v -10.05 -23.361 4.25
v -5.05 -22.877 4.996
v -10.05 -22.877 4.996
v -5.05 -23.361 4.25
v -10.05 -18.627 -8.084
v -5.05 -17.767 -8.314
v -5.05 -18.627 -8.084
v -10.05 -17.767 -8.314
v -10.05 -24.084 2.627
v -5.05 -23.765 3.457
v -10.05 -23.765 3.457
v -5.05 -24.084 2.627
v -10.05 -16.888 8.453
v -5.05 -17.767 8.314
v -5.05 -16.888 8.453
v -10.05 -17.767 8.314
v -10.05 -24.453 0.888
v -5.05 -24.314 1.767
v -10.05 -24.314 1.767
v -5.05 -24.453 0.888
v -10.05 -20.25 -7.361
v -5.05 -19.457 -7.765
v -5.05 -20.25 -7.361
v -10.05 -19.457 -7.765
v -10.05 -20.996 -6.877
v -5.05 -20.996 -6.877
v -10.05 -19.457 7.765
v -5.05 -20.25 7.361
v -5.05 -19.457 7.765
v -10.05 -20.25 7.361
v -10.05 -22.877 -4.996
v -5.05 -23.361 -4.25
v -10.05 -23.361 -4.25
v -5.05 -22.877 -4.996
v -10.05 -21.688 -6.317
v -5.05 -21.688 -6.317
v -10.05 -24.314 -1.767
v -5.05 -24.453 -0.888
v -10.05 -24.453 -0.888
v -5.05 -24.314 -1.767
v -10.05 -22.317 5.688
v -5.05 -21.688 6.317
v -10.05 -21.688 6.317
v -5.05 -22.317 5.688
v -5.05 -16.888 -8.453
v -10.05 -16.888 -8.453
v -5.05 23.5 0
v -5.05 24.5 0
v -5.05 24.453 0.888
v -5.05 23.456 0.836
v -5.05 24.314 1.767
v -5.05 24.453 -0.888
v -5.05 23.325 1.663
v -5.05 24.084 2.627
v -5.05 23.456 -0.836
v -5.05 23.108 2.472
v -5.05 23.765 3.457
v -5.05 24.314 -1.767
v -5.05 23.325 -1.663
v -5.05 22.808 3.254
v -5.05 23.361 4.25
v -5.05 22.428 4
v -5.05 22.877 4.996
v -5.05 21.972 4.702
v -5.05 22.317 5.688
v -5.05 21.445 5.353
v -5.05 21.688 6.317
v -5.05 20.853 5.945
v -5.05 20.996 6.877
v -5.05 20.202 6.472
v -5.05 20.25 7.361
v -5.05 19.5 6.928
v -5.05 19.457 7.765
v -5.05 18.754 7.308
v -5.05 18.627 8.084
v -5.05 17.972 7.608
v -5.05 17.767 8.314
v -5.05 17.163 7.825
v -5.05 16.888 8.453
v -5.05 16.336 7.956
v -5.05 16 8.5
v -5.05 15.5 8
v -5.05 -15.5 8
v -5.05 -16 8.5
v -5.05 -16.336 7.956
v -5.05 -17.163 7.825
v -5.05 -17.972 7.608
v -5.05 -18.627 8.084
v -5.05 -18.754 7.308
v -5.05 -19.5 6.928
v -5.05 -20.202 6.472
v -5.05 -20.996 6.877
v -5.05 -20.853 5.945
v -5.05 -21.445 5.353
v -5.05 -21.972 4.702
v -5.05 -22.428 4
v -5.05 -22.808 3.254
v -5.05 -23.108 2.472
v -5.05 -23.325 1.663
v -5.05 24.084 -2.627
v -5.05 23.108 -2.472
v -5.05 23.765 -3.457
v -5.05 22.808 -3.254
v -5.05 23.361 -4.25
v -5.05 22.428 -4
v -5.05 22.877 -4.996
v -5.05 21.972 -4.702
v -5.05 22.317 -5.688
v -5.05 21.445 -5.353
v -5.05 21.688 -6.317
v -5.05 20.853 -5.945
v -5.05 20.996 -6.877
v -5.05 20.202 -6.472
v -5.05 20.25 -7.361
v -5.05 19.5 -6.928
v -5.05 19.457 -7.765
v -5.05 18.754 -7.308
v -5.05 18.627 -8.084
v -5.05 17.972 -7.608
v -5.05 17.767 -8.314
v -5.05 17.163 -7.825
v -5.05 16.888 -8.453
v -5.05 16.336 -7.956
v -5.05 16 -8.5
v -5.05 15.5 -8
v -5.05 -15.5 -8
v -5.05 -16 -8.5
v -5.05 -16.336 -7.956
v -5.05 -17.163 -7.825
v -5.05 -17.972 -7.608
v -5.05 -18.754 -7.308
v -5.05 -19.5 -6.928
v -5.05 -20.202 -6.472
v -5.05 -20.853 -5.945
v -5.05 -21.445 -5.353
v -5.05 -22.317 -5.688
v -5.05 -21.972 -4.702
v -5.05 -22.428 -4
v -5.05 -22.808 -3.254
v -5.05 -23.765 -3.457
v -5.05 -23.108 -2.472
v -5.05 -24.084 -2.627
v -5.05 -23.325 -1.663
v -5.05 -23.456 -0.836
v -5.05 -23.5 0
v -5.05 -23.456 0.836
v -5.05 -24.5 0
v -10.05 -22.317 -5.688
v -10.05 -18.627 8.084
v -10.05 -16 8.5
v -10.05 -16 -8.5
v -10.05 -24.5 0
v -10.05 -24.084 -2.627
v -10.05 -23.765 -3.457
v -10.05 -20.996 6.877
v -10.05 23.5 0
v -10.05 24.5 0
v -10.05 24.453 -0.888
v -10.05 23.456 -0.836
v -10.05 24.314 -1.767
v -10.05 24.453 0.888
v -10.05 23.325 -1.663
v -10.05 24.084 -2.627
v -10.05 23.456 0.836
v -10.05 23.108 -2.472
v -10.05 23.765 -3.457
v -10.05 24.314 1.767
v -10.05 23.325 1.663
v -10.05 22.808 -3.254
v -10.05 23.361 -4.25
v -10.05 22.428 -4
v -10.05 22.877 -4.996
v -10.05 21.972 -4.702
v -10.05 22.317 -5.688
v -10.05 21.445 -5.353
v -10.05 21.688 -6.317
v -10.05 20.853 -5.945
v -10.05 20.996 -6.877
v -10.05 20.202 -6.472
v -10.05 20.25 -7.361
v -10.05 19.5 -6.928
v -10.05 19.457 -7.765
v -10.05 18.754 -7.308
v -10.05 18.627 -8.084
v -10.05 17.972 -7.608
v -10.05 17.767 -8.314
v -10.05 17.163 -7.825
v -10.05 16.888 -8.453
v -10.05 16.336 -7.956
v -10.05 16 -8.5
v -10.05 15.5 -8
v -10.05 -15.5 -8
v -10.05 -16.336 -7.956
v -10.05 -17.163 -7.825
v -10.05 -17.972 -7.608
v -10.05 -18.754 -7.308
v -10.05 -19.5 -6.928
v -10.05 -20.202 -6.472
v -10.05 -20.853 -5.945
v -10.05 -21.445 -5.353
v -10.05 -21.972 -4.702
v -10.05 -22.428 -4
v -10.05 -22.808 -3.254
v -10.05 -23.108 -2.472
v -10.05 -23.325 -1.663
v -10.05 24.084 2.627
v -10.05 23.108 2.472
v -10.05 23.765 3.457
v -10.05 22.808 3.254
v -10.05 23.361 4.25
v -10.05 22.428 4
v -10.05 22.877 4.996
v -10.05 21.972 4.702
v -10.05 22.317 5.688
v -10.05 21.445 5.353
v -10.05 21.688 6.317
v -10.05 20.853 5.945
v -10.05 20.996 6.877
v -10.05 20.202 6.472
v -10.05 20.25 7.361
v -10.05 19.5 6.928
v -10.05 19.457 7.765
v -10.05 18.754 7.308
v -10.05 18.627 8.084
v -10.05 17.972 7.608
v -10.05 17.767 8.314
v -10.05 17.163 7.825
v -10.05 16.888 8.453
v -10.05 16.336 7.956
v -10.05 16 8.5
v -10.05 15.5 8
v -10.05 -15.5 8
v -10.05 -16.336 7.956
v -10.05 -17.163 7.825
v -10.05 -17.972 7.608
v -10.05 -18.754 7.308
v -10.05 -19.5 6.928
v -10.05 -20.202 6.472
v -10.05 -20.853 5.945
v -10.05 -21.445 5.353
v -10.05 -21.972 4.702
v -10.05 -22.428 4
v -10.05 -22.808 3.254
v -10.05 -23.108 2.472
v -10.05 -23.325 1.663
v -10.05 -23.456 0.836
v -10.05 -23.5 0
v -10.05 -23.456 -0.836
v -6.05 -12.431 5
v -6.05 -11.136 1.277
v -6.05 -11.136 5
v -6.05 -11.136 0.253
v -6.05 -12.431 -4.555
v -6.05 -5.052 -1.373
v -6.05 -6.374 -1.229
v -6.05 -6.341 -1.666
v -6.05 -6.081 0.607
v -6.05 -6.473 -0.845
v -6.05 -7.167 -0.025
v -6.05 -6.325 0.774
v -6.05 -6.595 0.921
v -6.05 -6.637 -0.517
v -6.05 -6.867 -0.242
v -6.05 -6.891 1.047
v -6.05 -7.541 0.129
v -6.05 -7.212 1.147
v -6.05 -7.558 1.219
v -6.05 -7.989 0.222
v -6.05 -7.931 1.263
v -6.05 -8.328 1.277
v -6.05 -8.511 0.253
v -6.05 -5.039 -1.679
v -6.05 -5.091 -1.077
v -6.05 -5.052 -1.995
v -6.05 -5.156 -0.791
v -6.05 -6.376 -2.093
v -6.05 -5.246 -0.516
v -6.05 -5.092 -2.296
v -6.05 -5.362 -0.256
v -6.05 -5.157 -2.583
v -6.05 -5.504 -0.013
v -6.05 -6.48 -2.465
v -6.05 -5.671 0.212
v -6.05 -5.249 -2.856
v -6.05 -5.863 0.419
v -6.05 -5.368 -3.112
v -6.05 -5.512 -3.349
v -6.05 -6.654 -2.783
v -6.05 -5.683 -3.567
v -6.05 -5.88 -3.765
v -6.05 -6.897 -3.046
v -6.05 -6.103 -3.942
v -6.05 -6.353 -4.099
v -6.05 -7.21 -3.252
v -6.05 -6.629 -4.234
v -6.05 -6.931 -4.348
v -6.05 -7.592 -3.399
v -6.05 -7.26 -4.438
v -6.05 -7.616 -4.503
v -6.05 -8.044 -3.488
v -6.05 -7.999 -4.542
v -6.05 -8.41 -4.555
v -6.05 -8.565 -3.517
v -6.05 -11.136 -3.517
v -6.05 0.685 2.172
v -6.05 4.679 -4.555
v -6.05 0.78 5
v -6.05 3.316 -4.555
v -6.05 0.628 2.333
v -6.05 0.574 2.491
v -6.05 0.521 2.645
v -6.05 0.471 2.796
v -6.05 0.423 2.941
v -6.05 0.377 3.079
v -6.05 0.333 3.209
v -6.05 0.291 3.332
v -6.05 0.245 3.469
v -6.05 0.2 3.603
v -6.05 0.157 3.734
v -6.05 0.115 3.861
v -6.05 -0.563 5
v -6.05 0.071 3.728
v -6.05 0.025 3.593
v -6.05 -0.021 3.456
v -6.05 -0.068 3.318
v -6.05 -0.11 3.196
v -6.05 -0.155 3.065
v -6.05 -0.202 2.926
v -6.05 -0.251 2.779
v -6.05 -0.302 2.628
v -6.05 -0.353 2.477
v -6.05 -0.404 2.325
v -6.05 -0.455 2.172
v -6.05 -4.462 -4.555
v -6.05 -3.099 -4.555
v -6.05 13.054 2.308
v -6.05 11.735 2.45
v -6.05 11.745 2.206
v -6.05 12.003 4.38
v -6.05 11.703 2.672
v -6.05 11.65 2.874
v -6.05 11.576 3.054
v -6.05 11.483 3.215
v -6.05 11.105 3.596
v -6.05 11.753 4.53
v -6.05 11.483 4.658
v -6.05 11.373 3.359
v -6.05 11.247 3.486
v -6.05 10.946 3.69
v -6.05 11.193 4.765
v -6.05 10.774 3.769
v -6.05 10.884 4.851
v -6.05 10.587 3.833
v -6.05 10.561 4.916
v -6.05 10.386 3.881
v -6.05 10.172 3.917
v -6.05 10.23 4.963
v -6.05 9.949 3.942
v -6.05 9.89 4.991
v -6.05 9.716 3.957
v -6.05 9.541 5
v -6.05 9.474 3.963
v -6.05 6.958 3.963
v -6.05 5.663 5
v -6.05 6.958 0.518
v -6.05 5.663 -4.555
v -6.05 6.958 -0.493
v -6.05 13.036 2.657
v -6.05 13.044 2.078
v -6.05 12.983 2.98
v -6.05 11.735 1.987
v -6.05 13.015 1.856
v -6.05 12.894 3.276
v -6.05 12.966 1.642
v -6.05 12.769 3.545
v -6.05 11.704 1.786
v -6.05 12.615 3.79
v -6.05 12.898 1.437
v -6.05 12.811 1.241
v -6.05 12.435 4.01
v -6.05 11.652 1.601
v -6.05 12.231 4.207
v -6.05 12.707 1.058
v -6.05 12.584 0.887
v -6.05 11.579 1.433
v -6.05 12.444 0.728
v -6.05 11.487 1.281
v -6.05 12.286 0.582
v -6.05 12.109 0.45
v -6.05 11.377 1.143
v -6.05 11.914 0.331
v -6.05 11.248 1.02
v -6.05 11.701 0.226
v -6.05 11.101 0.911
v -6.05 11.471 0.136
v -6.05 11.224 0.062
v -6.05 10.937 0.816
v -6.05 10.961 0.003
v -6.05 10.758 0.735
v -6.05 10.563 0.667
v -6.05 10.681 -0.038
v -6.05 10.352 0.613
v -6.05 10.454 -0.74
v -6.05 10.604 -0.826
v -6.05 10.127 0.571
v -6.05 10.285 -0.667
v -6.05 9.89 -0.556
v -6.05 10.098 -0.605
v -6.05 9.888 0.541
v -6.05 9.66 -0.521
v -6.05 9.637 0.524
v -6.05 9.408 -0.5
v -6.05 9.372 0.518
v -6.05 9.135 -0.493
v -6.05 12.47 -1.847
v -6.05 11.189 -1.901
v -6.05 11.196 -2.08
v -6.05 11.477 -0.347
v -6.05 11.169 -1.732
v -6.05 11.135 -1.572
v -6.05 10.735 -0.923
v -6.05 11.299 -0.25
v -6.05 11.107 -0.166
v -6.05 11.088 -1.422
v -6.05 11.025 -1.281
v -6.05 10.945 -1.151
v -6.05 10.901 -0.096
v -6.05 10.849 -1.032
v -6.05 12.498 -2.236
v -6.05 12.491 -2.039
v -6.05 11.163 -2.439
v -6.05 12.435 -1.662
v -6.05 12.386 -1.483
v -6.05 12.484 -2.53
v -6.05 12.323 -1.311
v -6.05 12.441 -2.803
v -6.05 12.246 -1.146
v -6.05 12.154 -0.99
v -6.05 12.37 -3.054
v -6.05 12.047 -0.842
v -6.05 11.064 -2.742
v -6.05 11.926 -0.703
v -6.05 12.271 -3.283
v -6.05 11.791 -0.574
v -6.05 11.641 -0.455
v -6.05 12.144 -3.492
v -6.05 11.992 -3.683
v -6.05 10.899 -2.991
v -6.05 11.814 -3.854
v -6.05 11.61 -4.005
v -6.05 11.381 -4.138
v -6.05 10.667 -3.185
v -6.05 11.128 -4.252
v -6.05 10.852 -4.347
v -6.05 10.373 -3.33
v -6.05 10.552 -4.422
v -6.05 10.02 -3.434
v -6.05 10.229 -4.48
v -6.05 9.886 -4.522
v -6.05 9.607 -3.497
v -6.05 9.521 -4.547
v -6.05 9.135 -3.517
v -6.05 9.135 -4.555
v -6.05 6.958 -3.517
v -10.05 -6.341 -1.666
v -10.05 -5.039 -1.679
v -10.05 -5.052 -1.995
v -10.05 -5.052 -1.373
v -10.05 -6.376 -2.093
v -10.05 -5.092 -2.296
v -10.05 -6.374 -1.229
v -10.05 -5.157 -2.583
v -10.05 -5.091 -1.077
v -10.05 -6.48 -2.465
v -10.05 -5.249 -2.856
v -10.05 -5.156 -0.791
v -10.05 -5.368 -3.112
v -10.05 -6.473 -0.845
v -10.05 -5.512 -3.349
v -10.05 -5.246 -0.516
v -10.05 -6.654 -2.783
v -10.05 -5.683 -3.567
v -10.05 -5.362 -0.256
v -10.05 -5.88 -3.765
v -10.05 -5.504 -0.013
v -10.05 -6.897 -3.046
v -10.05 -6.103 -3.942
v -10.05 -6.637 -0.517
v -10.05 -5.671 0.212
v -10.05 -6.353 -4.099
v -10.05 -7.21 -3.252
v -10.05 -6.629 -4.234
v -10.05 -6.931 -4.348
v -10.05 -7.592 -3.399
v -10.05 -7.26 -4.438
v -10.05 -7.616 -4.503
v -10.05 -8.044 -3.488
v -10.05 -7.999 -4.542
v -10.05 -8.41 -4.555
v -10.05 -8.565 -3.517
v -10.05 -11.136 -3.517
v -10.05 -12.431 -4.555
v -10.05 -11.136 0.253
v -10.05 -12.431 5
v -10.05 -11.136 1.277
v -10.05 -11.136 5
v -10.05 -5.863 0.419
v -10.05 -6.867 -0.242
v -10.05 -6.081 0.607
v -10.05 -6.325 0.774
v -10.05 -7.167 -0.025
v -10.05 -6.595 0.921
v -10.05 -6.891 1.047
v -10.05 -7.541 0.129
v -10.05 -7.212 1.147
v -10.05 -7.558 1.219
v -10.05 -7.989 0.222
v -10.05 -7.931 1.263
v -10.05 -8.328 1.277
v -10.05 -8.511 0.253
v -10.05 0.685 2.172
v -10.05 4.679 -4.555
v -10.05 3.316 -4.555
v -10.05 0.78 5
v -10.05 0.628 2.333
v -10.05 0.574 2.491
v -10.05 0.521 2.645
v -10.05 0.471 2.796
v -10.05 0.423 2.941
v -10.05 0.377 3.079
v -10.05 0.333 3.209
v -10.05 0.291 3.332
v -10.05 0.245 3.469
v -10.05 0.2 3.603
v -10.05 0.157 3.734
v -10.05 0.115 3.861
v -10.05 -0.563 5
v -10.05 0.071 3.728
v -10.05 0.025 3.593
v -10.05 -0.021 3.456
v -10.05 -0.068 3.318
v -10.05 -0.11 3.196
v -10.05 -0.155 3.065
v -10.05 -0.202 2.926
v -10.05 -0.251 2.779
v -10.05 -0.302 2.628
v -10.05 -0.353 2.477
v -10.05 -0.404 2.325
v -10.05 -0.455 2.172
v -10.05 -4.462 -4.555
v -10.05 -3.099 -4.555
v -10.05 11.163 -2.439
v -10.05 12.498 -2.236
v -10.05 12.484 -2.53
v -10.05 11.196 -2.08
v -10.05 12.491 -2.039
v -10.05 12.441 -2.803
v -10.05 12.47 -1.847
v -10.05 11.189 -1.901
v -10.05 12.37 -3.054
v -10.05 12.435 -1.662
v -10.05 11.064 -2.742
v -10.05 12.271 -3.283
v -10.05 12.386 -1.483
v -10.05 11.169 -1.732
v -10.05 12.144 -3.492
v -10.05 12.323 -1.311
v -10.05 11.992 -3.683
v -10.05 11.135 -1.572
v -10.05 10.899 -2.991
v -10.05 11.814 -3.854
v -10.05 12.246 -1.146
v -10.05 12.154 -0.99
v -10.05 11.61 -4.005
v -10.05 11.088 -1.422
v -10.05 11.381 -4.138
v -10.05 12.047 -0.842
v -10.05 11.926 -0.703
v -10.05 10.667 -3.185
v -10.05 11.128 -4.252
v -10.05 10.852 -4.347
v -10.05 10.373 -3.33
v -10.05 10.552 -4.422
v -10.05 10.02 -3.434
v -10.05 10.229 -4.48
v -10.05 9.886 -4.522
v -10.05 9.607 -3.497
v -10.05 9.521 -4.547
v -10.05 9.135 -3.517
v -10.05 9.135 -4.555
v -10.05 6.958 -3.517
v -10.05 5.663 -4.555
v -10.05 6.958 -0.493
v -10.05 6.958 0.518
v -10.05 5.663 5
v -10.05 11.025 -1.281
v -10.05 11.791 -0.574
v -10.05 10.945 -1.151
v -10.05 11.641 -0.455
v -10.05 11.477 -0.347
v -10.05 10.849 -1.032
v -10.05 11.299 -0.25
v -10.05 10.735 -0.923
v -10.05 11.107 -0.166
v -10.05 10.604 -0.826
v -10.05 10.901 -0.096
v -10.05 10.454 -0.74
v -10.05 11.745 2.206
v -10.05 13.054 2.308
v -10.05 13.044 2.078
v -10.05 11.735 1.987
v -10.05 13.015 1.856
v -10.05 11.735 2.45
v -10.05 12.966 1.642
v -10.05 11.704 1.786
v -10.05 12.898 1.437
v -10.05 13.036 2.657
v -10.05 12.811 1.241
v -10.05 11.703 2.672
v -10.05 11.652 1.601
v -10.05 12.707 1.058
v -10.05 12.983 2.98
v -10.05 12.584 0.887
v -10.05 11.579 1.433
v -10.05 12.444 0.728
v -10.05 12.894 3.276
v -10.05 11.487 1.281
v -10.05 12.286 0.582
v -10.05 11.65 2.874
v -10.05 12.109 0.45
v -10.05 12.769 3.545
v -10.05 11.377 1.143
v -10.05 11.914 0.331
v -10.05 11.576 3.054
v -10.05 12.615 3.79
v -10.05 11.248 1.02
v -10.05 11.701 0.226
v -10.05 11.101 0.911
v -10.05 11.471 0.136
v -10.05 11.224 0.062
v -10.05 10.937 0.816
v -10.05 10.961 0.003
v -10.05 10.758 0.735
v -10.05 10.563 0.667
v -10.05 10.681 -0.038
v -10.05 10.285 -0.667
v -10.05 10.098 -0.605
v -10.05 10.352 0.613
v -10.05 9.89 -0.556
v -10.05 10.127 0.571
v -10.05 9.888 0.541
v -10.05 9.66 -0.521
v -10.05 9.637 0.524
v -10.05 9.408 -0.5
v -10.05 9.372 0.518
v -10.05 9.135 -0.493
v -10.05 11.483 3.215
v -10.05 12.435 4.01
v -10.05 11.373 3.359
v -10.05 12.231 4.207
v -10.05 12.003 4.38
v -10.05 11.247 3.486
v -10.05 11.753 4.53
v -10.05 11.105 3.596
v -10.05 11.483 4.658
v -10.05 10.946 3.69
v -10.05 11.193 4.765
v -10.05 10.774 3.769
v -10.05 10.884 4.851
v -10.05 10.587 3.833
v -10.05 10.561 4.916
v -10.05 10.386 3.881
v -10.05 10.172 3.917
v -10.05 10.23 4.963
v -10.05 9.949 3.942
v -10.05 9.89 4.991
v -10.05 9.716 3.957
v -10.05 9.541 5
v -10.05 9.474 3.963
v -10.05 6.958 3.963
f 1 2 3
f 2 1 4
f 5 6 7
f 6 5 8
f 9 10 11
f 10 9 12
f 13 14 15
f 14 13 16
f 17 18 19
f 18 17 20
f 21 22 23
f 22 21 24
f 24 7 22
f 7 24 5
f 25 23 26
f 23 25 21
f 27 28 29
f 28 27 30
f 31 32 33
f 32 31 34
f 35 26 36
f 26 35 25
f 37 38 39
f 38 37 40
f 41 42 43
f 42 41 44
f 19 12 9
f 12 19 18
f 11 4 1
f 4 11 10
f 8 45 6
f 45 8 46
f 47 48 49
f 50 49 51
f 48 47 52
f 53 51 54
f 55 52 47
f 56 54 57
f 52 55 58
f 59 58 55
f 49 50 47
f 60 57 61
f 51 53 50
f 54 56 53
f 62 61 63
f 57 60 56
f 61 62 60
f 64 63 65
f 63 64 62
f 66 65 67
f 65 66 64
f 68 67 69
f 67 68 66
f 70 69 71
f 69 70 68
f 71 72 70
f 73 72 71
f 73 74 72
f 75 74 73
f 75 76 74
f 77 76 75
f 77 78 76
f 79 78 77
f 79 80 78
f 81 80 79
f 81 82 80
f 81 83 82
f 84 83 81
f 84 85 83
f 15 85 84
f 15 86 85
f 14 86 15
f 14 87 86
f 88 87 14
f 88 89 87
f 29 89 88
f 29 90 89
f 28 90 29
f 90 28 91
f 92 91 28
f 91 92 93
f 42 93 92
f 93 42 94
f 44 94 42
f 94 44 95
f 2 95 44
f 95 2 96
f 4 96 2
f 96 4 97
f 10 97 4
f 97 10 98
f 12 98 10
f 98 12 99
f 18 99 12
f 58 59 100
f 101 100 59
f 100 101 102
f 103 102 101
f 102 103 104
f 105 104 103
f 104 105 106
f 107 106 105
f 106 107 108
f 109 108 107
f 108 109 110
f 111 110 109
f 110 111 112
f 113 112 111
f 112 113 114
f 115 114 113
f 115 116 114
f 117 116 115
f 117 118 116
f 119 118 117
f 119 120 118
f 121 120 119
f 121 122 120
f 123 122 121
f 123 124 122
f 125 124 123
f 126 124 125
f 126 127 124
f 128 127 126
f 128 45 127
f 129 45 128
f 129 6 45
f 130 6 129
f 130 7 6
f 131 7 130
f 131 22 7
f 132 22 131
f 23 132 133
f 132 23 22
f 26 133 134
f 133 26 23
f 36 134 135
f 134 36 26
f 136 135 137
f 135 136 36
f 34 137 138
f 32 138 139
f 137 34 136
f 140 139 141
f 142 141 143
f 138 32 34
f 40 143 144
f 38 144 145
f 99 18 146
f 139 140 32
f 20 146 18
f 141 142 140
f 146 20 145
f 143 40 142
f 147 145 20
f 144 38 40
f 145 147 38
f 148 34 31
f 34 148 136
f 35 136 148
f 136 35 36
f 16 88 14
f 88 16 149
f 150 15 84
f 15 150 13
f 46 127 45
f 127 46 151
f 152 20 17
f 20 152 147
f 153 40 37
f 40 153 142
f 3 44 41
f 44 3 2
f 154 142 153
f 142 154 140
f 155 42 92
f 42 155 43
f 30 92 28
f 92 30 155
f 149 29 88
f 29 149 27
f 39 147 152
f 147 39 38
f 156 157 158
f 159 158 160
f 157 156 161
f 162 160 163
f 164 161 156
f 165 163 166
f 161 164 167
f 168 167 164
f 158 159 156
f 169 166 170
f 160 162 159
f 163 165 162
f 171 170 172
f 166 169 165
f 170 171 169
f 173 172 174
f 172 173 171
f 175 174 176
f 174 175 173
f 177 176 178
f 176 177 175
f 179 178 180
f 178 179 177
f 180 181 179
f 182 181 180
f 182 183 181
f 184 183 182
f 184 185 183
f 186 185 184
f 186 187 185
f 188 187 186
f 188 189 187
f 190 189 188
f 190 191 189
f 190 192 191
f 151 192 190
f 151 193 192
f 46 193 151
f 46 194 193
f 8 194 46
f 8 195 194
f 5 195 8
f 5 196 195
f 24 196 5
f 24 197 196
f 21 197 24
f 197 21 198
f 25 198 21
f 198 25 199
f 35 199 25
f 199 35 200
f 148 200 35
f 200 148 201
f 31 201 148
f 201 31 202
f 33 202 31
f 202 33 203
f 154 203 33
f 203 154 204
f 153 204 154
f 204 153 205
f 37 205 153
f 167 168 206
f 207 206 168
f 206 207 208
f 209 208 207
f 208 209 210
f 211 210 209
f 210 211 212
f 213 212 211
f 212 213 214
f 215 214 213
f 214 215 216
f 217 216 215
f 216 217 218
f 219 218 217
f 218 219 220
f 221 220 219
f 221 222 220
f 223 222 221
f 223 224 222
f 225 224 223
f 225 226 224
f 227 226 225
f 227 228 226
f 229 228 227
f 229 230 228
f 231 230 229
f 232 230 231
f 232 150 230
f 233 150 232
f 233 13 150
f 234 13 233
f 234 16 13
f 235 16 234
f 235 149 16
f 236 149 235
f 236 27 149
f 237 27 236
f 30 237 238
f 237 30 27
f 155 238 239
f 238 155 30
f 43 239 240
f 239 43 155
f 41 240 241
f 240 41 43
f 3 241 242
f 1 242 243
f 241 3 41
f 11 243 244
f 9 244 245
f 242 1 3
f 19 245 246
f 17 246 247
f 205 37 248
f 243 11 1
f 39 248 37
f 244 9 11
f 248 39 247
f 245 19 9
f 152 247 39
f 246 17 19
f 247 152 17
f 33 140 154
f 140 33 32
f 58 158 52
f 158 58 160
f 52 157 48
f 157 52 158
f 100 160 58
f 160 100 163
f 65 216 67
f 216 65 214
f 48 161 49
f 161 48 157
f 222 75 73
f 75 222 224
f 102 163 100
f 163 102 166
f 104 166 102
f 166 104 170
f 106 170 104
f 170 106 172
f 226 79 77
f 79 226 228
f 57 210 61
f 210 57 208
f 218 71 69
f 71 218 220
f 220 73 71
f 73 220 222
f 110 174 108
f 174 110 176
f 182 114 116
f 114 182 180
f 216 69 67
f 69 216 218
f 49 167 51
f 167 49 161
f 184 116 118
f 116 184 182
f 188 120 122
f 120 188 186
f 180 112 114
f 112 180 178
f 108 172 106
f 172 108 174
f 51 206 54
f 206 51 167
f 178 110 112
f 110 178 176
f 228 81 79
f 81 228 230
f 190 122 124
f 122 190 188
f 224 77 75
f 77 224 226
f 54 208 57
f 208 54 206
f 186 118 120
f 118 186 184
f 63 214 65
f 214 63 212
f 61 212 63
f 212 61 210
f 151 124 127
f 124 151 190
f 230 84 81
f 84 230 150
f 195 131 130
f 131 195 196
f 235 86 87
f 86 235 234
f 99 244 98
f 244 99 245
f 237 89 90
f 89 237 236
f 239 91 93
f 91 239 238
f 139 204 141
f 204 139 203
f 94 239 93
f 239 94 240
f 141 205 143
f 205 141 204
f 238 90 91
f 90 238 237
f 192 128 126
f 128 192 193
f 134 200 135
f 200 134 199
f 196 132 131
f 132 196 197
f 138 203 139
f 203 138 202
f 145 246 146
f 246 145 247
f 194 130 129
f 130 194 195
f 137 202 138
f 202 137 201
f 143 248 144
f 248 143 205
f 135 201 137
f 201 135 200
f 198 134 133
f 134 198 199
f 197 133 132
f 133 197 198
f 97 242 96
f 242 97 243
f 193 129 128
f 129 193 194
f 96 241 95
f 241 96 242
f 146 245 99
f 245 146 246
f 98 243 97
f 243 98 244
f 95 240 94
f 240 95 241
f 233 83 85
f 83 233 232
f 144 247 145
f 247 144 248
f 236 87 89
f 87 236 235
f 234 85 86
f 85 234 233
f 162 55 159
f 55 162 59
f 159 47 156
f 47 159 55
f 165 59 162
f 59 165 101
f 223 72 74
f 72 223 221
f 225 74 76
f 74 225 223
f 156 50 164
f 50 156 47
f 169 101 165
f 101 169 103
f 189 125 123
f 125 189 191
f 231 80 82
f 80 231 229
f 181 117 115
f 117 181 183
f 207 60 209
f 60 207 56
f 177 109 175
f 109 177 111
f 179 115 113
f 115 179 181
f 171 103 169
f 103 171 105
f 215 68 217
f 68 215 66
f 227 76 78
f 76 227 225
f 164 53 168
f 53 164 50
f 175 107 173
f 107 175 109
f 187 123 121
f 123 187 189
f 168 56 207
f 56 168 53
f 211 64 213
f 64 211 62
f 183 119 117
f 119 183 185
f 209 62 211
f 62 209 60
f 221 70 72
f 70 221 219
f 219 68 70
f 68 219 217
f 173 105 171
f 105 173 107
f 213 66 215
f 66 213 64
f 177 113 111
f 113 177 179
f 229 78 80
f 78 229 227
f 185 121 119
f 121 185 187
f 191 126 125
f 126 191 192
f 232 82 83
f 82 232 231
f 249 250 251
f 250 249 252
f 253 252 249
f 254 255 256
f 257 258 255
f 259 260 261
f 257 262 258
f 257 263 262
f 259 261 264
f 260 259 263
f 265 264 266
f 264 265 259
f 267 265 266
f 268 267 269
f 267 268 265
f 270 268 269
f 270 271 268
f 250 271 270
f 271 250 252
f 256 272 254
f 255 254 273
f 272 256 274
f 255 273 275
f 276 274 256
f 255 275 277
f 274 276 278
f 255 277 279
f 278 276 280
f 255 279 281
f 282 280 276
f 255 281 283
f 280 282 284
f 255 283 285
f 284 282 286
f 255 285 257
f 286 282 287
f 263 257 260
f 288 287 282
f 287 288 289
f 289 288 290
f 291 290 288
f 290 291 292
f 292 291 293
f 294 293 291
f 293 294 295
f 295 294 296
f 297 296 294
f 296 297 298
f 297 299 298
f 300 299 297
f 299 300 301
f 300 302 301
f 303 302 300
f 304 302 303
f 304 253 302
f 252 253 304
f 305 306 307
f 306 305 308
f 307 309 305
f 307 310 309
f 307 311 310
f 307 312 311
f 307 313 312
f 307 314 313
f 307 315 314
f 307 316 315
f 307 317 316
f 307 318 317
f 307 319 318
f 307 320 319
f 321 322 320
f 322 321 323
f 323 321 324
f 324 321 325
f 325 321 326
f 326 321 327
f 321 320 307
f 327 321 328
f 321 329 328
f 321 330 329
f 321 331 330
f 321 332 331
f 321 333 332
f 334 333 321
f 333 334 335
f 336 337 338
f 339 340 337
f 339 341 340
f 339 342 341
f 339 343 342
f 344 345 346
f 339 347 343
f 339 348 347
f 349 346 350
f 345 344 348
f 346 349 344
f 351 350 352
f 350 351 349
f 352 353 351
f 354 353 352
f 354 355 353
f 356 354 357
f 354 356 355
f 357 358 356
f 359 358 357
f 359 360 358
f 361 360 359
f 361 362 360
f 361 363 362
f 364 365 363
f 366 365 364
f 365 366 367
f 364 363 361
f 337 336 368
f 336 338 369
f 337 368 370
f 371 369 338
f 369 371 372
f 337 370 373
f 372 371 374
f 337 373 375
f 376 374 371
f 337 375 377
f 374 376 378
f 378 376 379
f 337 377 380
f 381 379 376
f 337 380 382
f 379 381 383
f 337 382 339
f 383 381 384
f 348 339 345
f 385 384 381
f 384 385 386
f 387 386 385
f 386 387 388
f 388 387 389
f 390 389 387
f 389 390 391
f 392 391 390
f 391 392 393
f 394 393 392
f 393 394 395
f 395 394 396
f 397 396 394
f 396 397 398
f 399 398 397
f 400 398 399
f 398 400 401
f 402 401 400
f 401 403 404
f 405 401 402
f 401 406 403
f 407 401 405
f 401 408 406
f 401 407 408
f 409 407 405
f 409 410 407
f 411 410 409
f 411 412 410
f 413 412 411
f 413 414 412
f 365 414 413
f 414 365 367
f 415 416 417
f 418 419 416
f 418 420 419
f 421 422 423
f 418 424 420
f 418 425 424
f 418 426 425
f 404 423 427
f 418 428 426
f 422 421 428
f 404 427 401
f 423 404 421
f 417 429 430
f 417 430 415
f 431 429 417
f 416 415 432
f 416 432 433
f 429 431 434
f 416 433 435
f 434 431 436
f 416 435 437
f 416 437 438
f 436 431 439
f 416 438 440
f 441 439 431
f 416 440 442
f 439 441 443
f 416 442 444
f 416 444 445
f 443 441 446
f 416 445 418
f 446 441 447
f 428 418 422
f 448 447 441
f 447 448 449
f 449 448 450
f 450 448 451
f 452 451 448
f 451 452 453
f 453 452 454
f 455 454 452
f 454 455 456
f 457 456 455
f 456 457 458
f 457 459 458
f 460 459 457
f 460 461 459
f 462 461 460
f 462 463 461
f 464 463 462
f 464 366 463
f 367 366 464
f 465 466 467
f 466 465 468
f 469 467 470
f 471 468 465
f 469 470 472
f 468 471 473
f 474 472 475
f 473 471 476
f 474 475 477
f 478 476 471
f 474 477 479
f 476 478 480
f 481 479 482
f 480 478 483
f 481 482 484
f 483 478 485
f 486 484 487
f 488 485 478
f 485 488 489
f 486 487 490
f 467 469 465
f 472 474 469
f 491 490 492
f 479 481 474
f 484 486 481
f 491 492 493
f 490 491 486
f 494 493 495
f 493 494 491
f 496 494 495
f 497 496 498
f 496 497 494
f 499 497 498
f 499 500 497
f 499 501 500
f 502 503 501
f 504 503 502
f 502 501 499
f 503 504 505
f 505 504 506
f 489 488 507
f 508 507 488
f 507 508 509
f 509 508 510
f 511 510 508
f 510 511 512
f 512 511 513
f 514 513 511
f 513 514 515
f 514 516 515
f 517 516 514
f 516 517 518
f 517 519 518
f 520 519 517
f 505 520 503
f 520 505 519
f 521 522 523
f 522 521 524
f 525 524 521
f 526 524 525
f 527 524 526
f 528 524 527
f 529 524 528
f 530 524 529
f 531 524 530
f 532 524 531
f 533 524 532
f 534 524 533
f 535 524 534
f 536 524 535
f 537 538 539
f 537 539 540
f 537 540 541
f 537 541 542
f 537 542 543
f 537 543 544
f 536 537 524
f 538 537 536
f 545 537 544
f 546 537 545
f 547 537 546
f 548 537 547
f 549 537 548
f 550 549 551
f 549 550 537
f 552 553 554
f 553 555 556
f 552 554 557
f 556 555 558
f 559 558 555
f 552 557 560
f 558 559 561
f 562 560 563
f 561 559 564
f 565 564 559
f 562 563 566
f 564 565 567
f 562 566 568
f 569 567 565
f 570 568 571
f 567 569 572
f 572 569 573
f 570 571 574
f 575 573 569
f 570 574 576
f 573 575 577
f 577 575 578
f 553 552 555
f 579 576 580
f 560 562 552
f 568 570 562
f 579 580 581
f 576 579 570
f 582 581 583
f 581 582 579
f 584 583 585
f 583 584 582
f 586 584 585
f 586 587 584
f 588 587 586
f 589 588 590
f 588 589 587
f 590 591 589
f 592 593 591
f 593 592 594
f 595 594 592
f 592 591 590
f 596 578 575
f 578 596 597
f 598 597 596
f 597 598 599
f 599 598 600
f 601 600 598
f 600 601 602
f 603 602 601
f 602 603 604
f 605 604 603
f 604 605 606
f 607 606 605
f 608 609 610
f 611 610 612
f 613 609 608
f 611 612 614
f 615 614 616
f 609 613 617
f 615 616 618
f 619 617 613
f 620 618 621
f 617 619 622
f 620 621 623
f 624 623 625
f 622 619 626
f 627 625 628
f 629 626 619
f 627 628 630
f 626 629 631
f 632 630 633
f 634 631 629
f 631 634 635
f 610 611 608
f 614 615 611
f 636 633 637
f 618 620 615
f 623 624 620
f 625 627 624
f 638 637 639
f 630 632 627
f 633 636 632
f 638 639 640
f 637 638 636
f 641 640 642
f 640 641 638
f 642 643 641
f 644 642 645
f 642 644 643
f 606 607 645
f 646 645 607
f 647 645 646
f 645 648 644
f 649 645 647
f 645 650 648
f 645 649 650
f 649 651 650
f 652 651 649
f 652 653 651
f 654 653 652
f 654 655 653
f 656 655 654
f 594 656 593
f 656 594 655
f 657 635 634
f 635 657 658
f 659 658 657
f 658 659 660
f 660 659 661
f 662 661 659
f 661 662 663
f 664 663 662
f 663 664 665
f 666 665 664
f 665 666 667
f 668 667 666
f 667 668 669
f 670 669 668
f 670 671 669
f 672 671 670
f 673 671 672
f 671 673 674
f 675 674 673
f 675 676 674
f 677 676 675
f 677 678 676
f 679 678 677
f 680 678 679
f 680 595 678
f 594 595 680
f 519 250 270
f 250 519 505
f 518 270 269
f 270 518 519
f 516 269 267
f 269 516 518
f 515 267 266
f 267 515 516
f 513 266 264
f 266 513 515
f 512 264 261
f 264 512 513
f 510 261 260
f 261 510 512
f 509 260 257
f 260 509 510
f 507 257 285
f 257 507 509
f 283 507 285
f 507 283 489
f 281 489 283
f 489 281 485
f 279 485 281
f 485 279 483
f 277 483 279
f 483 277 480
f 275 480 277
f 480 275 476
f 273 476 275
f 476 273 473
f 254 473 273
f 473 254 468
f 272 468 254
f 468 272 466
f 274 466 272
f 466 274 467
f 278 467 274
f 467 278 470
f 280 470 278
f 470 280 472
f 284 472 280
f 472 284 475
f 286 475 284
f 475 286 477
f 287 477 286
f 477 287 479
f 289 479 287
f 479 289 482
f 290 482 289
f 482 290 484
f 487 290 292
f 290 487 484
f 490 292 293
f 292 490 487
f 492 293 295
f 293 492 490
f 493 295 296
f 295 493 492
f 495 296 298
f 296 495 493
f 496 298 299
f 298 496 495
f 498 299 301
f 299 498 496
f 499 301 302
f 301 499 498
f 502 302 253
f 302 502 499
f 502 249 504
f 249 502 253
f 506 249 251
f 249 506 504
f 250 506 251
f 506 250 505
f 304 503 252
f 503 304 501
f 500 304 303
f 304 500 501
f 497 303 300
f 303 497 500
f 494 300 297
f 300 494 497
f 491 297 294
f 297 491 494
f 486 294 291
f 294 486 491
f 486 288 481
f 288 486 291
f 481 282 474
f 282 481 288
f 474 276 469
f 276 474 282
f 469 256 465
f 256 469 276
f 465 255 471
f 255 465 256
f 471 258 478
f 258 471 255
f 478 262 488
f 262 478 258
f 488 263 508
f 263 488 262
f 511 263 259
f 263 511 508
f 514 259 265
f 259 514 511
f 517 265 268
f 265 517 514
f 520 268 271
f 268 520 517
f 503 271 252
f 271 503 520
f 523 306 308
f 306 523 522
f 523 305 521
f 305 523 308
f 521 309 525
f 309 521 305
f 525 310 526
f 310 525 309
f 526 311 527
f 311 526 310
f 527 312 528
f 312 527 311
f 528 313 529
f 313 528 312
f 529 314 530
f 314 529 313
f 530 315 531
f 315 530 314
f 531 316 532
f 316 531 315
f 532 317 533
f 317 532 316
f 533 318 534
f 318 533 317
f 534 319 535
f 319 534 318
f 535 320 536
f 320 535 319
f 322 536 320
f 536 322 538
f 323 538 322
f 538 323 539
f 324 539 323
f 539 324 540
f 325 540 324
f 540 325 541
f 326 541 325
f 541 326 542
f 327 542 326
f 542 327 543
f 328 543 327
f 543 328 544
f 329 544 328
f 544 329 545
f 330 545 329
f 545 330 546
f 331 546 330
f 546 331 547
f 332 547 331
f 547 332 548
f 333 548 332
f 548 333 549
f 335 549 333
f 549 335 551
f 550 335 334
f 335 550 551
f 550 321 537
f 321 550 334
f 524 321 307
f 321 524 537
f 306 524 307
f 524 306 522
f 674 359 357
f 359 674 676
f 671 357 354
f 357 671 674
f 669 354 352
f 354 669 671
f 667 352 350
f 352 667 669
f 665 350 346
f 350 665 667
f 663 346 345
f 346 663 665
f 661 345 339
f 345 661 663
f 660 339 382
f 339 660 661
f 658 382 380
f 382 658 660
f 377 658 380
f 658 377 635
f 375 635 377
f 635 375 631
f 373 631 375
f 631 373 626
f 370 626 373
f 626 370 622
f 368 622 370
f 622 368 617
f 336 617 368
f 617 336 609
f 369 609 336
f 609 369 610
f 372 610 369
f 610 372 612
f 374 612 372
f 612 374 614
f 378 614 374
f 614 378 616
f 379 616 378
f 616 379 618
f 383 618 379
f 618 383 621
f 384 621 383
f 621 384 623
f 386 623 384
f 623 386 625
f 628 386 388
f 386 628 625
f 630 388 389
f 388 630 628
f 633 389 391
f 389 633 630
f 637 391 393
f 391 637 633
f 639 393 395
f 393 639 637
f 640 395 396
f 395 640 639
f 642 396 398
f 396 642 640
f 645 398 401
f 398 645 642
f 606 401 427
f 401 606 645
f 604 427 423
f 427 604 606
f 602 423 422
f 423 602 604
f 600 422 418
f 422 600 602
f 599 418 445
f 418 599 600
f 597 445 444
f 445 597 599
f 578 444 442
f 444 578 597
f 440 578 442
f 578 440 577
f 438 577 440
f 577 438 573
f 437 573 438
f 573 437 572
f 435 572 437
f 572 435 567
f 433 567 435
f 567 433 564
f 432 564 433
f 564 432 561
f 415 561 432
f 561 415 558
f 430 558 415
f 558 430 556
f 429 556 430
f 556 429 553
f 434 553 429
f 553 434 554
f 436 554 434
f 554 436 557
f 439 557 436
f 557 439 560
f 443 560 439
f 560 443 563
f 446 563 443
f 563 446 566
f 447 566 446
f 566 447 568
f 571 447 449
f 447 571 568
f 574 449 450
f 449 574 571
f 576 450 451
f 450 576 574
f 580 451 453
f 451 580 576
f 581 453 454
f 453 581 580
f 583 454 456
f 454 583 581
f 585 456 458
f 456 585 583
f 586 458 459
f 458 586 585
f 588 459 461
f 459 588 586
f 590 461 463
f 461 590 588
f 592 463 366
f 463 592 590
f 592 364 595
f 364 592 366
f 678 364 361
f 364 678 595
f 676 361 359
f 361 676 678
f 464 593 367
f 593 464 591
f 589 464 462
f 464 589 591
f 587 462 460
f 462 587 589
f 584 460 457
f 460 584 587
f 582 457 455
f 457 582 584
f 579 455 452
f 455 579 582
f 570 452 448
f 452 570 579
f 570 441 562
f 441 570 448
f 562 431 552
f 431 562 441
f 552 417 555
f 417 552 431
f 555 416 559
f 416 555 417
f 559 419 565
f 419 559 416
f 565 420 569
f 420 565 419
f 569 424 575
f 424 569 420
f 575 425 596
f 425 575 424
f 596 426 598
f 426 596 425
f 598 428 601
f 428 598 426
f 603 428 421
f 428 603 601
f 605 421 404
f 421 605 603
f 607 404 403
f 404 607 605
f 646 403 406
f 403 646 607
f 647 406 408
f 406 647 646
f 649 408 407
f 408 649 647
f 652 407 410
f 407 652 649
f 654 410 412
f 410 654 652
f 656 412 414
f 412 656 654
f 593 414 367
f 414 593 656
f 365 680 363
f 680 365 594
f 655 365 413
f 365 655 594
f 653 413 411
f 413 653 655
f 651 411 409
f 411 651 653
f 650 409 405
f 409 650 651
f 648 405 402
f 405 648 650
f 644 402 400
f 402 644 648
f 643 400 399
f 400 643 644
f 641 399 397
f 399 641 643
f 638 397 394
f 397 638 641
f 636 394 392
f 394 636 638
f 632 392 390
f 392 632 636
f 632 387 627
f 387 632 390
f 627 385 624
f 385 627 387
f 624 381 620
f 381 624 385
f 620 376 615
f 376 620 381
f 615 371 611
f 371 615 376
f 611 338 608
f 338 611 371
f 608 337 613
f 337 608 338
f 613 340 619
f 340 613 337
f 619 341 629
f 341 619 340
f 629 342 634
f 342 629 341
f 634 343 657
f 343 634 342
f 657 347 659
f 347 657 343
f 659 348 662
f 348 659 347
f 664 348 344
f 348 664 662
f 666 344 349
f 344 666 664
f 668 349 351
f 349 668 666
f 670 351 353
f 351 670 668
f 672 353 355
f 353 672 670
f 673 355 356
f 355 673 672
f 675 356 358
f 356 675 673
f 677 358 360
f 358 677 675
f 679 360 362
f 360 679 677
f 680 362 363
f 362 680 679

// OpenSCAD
// Filament Schild


module Winkel() {
    
    difference() {
        cube([20,50,20],center=true);
        translate([3,0,0])
        cube([15,60,15],center=true);
    }
}

module Schrift(Text) {
    linear_extrude(4)
    text(Text,halign="center");
}

module Oval(xx,yy,zz) {
    translate([-yy/2,0,0])
    cylinder(d=xx,zz,center=true,$fn=60);
    translate([yy/2,0,0])
    cylinder(d=xx,zz,center=true,$fn=60);
    cube([yy,xx,zz],center=true);
}

module Rahmen(){
    difference(){
        Oval(17,32,5);
        Oval(16,31,6);
    }
}

module Schild() {
    difference(){
        Winkel();
        rotate([-90,0,90])
        translate([0,0,8])
        Rahmen();
        rotate([-90,0,90])
        translate([0,-5,6])
        Schrift("PVB");}
    }
/*    
Schild();
*/
color("Black") {
    rotate([-90,0,90])
    translate([0,0,7.55])
    Rahmen();
    rotate([-90,0,90])
    translate([0,-5,6.05])
    Schrift("PVB");
}
